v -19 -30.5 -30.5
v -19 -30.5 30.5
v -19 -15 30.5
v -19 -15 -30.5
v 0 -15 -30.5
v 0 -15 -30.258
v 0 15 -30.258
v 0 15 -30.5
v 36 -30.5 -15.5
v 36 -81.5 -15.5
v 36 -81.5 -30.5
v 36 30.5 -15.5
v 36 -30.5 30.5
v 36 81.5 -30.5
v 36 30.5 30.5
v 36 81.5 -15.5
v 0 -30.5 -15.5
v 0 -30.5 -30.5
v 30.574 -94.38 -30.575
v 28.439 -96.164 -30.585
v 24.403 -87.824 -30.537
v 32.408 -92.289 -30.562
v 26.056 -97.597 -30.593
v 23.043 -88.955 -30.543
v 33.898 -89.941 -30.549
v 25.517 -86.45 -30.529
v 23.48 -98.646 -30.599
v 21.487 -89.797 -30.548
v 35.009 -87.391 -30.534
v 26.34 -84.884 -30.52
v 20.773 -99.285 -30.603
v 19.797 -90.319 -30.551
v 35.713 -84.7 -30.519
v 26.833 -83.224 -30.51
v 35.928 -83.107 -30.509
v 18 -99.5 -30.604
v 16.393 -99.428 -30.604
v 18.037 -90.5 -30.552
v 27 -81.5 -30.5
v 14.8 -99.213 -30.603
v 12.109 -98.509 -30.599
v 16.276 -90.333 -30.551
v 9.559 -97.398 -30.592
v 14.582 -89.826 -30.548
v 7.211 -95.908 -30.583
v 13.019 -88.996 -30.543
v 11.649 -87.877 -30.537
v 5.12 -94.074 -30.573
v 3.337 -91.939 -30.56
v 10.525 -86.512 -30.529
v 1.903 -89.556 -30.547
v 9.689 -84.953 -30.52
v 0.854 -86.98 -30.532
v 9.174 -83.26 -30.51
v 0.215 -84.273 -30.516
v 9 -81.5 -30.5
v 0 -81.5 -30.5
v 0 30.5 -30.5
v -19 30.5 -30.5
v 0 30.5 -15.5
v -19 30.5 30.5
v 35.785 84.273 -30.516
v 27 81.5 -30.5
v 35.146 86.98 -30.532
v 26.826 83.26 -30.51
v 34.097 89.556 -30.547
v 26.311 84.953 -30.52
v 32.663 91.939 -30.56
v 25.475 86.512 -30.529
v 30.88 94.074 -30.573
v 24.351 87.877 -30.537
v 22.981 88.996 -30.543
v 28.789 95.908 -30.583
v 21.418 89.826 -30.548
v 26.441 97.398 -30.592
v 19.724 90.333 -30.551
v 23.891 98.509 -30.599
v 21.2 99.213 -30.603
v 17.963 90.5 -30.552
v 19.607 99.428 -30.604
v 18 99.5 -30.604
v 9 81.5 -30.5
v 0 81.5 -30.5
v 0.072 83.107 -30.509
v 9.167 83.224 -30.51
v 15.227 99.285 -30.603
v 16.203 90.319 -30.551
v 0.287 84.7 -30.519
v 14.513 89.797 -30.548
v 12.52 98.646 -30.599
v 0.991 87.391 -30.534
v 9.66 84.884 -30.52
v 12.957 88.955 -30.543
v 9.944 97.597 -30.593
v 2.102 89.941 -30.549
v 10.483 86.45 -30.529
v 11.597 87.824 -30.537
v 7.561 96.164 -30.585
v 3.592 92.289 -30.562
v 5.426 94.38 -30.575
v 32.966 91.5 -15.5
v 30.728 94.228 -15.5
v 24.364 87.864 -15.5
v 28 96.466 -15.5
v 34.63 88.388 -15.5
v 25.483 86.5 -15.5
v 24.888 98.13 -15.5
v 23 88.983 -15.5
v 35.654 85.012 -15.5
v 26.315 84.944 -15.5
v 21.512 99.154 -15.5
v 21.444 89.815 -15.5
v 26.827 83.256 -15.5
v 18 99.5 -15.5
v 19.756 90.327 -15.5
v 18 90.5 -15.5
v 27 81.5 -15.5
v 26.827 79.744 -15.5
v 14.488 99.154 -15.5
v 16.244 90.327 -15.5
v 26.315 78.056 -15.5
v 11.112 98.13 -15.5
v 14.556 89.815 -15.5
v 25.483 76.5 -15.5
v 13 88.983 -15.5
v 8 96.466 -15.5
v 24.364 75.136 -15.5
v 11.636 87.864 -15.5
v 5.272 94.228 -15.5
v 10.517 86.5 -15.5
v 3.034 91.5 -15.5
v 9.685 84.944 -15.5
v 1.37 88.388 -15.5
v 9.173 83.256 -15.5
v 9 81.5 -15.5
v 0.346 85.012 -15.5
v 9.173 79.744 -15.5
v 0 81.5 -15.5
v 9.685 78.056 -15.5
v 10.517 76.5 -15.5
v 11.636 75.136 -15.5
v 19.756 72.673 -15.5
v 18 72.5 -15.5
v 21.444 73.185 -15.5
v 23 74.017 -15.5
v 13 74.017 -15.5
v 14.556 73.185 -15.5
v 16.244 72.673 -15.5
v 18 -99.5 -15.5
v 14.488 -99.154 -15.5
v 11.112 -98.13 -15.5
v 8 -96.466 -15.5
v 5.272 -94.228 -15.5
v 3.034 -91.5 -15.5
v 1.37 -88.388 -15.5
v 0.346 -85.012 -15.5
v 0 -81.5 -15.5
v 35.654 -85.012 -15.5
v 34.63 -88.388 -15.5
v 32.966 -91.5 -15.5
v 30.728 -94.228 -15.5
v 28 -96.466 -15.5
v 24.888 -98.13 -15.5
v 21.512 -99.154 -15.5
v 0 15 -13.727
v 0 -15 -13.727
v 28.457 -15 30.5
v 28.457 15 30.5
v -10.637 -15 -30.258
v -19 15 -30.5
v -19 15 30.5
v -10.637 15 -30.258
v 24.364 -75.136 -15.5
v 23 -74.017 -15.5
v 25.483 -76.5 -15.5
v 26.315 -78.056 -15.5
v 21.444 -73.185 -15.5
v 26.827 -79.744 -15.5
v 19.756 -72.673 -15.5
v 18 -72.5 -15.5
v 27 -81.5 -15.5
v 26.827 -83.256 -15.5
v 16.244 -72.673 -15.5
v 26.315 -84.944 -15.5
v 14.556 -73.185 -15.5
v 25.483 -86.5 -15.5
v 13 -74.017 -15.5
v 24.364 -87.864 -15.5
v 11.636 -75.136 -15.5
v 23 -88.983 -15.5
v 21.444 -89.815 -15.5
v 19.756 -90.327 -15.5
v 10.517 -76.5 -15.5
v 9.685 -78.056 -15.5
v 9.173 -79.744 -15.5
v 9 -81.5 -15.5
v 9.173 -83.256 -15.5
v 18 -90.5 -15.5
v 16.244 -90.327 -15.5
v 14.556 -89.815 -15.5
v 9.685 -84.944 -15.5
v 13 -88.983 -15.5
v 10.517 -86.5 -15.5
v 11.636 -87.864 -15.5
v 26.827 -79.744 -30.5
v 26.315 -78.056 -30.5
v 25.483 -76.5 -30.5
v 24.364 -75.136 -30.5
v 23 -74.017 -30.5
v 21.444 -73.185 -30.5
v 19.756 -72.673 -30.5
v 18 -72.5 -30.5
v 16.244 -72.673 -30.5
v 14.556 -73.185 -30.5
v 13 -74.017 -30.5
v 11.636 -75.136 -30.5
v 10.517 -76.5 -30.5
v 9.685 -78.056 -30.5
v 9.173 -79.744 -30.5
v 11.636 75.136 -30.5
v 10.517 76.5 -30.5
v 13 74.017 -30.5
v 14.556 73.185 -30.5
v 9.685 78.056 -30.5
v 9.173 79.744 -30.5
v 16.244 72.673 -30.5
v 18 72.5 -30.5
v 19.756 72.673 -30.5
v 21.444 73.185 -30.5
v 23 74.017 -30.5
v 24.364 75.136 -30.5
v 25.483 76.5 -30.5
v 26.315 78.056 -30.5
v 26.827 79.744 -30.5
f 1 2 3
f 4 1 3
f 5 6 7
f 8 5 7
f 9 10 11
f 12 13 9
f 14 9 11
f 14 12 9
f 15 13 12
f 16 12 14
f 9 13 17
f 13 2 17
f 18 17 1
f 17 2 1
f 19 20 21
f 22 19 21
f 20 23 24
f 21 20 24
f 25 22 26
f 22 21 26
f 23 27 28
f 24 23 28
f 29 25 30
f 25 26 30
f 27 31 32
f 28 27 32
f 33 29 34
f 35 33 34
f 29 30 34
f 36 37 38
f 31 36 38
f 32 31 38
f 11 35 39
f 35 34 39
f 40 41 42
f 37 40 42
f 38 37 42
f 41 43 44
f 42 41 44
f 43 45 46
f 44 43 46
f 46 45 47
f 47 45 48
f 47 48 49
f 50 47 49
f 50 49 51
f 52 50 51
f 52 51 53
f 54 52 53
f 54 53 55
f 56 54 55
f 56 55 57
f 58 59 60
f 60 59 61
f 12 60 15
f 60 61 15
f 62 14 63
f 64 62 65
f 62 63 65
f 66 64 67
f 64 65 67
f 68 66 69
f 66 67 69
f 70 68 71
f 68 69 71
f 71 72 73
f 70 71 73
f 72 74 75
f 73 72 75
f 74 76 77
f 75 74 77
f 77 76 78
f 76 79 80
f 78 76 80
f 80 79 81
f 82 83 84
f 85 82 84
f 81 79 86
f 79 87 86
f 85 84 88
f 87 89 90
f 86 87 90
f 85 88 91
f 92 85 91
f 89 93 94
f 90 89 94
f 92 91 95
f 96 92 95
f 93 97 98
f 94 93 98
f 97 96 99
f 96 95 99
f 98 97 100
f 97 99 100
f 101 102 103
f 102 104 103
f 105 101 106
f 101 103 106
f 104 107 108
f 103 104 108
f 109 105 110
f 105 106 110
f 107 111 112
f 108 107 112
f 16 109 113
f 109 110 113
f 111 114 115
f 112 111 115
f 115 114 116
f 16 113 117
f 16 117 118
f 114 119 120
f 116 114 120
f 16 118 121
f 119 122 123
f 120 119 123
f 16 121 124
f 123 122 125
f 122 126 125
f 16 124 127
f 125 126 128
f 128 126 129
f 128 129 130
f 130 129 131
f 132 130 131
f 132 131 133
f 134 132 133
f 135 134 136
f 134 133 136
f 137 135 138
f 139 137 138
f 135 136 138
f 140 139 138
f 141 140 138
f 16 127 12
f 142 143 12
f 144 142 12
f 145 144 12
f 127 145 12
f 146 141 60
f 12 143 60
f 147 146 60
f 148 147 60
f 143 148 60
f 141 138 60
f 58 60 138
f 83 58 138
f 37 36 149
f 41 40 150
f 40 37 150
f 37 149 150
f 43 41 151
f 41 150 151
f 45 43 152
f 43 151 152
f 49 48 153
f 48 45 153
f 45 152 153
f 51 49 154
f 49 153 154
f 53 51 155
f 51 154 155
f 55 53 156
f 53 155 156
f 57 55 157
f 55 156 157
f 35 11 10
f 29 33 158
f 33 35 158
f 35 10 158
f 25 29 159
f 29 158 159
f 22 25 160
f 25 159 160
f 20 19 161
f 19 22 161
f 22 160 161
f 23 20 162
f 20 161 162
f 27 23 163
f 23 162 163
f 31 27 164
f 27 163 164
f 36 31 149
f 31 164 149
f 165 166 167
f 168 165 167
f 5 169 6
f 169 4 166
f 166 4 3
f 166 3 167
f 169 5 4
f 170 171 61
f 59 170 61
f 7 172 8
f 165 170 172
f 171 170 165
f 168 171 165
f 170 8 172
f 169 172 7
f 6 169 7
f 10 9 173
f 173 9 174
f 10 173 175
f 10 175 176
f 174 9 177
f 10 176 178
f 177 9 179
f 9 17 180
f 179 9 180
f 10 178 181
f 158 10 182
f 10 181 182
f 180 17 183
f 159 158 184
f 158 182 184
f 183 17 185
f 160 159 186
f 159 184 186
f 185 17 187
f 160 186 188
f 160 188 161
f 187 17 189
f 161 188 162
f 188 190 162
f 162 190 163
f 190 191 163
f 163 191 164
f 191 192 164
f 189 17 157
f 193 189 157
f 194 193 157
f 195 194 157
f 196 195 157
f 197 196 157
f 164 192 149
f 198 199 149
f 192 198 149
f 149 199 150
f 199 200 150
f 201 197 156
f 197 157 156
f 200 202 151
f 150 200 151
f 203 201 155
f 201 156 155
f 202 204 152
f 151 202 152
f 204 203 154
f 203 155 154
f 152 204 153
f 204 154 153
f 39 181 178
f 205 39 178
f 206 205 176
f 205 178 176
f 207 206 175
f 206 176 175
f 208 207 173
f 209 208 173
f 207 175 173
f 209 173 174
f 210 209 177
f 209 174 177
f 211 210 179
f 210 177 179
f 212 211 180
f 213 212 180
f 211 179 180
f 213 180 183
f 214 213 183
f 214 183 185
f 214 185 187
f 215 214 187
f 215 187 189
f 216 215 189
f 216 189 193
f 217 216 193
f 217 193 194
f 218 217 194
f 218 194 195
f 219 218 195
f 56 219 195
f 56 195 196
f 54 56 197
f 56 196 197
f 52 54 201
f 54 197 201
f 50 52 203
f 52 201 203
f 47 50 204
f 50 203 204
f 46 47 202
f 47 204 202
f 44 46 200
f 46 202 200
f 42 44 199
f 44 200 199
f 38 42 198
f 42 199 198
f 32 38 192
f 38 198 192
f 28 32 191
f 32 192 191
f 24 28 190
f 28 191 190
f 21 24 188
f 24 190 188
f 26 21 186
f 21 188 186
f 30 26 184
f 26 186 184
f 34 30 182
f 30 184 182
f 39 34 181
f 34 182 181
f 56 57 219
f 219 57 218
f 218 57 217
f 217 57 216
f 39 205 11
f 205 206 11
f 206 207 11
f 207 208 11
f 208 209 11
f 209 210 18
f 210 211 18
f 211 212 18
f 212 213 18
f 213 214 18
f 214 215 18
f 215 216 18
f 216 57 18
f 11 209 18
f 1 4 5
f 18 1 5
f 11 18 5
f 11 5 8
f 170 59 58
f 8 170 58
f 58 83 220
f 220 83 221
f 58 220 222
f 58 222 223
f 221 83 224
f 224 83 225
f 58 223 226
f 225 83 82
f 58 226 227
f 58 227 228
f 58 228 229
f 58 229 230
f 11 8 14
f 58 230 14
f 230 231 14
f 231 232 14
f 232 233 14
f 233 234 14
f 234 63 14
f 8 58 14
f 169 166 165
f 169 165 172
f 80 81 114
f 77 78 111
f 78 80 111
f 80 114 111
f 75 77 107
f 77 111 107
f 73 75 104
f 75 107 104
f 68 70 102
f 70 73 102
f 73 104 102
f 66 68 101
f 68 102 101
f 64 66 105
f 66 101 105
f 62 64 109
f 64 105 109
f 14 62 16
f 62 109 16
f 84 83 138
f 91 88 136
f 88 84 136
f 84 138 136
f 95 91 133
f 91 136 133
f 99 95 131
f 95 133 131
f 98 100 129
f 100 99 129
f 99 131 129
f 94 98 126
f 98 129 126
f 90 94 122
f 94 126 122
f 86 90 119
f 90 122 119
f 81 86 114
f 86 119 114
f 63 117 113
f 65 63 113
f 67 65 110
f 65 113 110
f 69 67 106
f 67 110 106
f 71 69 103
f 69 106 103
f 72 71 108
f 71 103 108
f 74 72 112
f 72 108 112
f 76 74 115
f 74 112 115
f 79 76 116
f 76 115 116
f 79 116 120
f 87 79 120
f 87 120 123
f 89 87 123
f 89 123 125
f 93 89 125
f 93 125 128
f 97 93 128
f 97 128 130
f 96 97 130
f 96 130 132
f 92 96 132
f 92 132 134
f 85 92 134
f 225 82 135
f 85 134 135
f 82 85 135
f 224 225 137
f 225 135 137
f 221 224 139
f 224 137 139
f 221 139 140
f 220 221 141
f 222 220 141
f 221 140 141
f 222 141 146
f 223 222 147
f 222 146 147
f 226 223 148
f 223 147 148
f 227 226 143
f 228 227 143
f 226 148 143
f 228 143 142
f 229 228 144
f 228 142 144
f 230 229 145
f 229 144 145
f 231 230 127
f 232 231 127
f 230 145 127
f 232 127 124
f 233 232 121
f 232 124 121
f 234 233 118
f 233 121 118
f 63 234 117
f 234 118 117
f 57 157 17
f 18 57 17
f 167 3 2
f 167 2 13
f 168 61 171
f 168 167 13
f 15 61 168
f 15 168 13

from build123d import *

# Parameters (mm, degrees)
F0_W      = 51
F0_H      = 15
F1_DEPTH  = 36
F3_R      = 9
F4_DEPTH  = 103.1
F6_DEPTH  = 15
F7_DEPTH  = 15
F2_W      = 19
F2_H      = 15.5
F8_DEPTH  = 61
F9_DEPTH  = 100
F10_DEPTH = 100
F11_DEPTH = 25
F12_DEPTH = 25


with BuildPart() as f1:
    # F0 (on Right) → F1 (new body)
    with BuildSketch(Plane.YZ):
        Polygon((30.5, 30.5), (-30.5, 30.5), (-30.5, -15.5), (-30.5, -30.5), (30.5, -30.5), (30.5, -15.5), align=None)
        with Locations((-56, -23)):
            Rectangle(F0_W, F0_H)
        with Locations((56, -23)):
            Rectangle(F0_W, F0_H)
        Polygon((-81.5, -30.5), (-81.5, -15.5), (-99.5, -15.5), (-99.5, -30.6042674929), align=None)
        Polygon((99.5, -15.5), (81.5, -15.5), (81.5, -30.5), (99.5, -30.6042674929), align=None)
    extrude(amount=F1_DEPTH)

    # F3 (on Top) → F4 (cut)
    with BuildSketch(Plane.XY):
        with Locations((18, 81.5)):
            Circle(F3_R)
        with Locations((18, -81.5)):
            Circle(F3_R)
    extrude(amount=-F4_DEPTH, mode=Mode.SUBTRACT)

    # F5 (on Front) → F6 (cut)
    with BuildSketch(Plane.XZ):
        Polygon((0, -13.7268389231), (28.6131525338, 30.7420096008), (-18.6368474662, 30.7420096008), (-18.6368474662, -30.2579903992), (-10.6368474662, -30.2579903992), align=None)
    extrude(amount=F6_DEPTH, mode=Mode.SUBTRACT)

    # F5 (on Front) → F7 (cut)
    with BuildSketch(Plane.XZ):
        Polygon((0, -13.7268389231), (28.6131525338, 30.7420096008), (-18.6368474662, 30.7420096008), (-18.6368474662, -30.2579903992), (-10.6368474662, -30.2579903992), align=None)
    extrude(amount=-F7_DEPTH, mode=Mode.SUBTRACT)

    # F2 (on face) → F8 (join)
    with BuildSketch(Plane.XY.offset(30.5)):
        with Locations((-9.5, 22.75)):
            Rectangle(F2_W, F2_H)
        with Locations((-9.5, -22.75)):
            Rectangle(F2_W, F2_H)
    extrude(amount=-F8_DEPTH)

    # F2 (on face) → F9 (cut)
    with BuildSketch(Plane.XY.offset(30.5)):
        with BuildLine():
            Line((36, -99.5), (36, -81.5))
            ThreePointArc((36, -81.5), (30.7279220614, -94.2279220614), (18, -99.5))
            Line((18, -99.5), (36, -99.5))
        make_face()
        with BuildLine():
            ThreePointArc((18, 99.5), (30.7279220614, 94.2279220614), (36, 81.5))
            Line((36, 81.5), (36, 99.5))
            Line((36, 99.5), (18, 99.5))
        make_face()
        with BuildLine():
            Line((0, 99.5), (0, 81.4999998705))
            ThreePointArc((0, 81.4999998705), (5.2720778928, 94.2279220156), (18, 99.5))
            Line((18, 99.5), (0, 99.5))
        make_face()
    extrude(amount=-F9_DEPTH, mode=Mode.SUBTRACT)

    # F2 (on face) → F10 (cut)
    with BuildSketch(Plane.XY.offset(30.5)):
        with BuildLine():
            ThreePointArc((18, -99.5), (5.2720779386, -94.2279220614), (0, -81.5))
            Line((0, -81.5), (0, -99.5))
            Line((0, -99.5), (18, -99.5))
        make_face()
        with BuildLine():
            Line((36, -99.5), (36, -81.5))
            ThreePointArc((36, -81.5), (30.7279220614, -94.2279220614), (18, -99.5))
            Line((18, -99.5), (36, -99.5))
        make_face()
    extrude(amount=-F10_DEPTH, mode=Mode.SUBTRACT)

    # F5 (on Front) → F11 (join)
    with BuildSketch(Plane.XZ):
        Polygon((0, -30.2579903992), (0, -13.7268389231), (-10.6368474662, -30.2579903992), align=None)
    extrude(amount=F11_DEPTH)

    # F5 (on Front) → F12 (join)
    with BuildSketch(Plane.XZ):
        Polygon((0, -30.2579903992), (0, -13.7268389231), (-10.6368474662, -30.2579903992), align=None)
    extrude(amount=-F12_DEPTH)


solid = f1.part
